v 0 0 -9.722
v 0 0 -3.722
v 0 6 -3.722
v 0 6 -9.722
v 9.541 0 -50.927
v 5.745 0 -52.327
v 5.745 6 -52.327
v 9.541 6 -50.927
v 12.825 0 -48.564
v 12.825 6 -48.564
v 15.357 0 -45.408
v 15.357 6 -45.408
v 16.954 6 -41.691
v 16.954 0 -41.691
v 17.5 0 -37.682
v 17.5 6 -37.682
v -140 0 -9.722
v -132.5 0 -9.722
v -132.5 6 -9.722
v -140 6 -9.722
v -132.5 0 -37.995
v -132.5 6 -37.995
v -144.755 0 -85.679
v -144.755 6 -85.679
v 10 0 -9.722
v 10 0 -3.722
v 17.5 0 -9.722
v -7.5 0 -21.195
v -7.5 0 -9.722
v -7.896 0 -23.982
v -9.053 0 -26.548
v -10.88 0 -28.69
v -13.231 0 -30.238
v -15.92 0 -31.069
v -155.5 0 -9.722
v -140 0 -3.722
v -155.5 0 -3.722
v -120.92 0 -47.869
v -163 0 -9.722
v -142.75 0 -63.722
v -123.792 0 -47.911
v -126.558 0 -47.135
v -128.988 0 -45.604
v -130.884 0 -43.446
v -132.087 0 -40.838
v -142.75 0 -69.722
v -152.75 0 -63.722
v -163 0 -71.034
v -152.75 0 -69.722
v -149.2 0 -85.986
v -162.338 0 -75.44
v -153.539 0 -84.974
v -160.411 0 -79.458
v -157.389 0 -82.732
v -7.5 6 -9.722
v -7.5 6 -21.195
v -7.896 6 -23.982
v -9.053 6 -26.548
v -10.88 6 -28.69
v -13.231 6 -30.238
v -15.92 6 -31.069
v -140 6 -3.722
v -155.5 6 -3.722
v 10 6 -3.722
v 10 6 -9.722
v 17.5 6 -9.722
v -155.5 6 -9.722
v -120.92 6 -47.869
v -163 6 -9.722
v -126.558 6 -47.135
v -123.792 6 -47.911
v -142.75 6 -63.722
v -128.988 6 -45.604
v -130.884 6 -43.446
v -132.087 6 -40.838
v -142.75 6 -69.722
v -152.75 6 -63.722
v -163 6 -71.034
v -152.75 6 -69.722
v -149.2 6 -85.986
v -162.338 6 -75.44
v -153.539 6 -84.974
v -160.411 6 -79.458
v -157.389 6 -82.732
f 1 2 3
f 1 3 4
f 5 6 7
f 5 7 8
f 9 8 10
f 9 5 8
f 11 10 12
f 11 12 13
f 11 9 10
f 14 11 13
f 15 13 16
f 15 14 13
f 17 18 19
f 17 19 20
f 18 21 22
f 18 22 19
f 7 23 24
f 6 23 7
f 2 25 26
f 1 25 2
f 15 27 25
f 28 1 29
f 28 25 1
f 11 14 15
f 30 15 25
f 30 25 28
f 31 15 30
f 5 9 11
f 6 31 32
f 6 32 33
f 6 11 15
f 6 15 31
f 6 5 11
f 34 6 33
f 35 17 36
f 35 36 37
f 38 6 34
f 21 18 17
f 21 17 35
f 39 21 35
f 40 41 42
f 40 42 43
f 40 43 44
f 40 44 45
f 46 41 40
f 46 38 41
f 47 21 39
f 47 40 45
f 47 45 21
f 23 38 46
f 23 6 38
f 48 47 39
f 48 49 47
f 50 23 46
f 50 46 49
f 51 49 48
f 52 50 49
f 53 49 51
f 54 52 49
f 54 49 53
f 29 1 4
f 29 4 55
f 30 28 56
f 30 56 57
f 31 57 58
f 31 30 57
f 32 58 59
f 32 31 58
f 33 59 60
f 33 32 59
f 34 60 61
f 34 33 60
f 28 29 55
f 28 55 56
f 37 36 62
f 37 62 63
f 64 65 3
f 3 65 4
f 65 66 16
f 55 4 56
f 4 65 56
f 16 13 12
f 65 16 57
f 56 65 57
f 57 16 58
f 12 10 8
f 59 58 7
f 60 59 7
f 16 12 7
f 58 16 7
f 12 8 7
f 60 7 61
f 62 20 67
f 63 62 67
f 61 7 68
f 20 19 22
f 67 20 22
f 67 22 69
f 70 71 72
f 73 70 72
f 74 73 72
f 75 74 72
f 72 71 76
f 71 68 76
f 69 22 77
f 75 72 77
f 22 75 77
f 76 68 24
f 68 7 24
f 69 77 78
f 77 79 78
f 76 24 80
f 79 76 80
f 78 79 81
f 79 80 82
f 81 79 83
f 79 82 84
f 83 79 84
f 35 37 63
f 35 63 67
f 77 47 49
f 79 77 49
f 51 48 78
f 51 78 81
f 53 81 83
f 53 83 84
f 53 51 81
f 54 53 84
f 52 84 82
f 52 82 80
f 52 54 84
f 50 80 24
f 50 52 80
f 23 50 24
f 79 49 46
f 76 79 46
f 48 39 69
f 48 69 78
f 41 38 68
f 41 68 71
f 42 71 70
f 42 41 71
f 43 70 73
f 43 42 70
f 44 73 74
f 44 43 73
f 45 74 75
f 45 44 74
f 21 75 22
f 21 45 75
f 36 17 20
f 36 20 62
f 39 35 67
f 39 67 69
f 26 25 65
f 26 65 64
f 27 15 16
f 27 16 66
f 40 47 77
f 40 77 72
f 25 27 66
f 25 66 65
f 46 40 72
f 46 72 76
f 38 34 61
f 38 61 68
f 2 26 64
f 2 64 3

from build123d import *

# Parameters (mm, degrees)
SKETCH1_W           = 10
SKETCH1_H           = 6
BOSS_EXTRUDE1_DEPTH = 6


with BuildPart() as part:
    # Sketch1 → Boss-Extrude1 (new body)
    with BuildSketch(Plane(origin=(0, 0, 0), x_dir=(1, 0, 0), z_dir=(0, 1, 0))):
        with BuildLine():
            Line((0, 9.722175855), (-7.5, 9.722175855))
            Line((-7.5, 9.722175855), (-7.5, 21.194984734))
            ThreePointArc((-7.5, 21.194984734), (-9.890826257, 27.683472612), (-15.920094989, 31.069391053))
            Line((-15.920094989, 31.069391053), (-120.920094989, 47.869391053))
            ThreePointArc((-120.920094989, 47.869391053), (-128.988487878, 45.604158477), (-132.5, 37.994984734))
            Line((-132.5, 37.994984734), (-132.5, 9.722175855))
            Line((-132.5, 9.722175855), (-140, 9.722175855))
            Line((-140, 9.722175855), (-140, 3.722175855))
            Line((-140, 3.722175855), (-155.5, 3.722175855))
            Line((-155.5, 3.722175855), (-155.5, 9.722175855))
            Line((-155.5, 9.722175855), (-163, 9.722175855))
            Line((-163, 9.722175855), (-163, 71.03416911))
            ThreePointArc((-163, 71.03416911), (-157.389342775, 82.732042518), (-144.754634366, 85.678881532))
            Line((-144.754634366, 85.678881532), (5.745365634, 52.327080978))
            ThreePointArc((5.745365634, 52.327080978), (14.197873407, 47.071711331), (17.5, 37.682368556))
            Line((17.5, 37.682368556), (17.5, 9.722175855))
            Line((17.5, 9.722175855), (10, 9.722175855))
            Line((10, 9.722175855), (10, 3.722175855))
            Line((10, 3.722175855), (0, 3.722175855))
            Line((0, 3.722175855), (0, 9.722175855))
        make_face()
        with Locations((-147.75, 66.722175855)):
            Rectangle(SKETCH1_W, SKETCH1_H, mode=Mode.SUBTRACT)
    extrude(amount=BOSS_EXTRUDE1_DEPTH)


solid = part.part
